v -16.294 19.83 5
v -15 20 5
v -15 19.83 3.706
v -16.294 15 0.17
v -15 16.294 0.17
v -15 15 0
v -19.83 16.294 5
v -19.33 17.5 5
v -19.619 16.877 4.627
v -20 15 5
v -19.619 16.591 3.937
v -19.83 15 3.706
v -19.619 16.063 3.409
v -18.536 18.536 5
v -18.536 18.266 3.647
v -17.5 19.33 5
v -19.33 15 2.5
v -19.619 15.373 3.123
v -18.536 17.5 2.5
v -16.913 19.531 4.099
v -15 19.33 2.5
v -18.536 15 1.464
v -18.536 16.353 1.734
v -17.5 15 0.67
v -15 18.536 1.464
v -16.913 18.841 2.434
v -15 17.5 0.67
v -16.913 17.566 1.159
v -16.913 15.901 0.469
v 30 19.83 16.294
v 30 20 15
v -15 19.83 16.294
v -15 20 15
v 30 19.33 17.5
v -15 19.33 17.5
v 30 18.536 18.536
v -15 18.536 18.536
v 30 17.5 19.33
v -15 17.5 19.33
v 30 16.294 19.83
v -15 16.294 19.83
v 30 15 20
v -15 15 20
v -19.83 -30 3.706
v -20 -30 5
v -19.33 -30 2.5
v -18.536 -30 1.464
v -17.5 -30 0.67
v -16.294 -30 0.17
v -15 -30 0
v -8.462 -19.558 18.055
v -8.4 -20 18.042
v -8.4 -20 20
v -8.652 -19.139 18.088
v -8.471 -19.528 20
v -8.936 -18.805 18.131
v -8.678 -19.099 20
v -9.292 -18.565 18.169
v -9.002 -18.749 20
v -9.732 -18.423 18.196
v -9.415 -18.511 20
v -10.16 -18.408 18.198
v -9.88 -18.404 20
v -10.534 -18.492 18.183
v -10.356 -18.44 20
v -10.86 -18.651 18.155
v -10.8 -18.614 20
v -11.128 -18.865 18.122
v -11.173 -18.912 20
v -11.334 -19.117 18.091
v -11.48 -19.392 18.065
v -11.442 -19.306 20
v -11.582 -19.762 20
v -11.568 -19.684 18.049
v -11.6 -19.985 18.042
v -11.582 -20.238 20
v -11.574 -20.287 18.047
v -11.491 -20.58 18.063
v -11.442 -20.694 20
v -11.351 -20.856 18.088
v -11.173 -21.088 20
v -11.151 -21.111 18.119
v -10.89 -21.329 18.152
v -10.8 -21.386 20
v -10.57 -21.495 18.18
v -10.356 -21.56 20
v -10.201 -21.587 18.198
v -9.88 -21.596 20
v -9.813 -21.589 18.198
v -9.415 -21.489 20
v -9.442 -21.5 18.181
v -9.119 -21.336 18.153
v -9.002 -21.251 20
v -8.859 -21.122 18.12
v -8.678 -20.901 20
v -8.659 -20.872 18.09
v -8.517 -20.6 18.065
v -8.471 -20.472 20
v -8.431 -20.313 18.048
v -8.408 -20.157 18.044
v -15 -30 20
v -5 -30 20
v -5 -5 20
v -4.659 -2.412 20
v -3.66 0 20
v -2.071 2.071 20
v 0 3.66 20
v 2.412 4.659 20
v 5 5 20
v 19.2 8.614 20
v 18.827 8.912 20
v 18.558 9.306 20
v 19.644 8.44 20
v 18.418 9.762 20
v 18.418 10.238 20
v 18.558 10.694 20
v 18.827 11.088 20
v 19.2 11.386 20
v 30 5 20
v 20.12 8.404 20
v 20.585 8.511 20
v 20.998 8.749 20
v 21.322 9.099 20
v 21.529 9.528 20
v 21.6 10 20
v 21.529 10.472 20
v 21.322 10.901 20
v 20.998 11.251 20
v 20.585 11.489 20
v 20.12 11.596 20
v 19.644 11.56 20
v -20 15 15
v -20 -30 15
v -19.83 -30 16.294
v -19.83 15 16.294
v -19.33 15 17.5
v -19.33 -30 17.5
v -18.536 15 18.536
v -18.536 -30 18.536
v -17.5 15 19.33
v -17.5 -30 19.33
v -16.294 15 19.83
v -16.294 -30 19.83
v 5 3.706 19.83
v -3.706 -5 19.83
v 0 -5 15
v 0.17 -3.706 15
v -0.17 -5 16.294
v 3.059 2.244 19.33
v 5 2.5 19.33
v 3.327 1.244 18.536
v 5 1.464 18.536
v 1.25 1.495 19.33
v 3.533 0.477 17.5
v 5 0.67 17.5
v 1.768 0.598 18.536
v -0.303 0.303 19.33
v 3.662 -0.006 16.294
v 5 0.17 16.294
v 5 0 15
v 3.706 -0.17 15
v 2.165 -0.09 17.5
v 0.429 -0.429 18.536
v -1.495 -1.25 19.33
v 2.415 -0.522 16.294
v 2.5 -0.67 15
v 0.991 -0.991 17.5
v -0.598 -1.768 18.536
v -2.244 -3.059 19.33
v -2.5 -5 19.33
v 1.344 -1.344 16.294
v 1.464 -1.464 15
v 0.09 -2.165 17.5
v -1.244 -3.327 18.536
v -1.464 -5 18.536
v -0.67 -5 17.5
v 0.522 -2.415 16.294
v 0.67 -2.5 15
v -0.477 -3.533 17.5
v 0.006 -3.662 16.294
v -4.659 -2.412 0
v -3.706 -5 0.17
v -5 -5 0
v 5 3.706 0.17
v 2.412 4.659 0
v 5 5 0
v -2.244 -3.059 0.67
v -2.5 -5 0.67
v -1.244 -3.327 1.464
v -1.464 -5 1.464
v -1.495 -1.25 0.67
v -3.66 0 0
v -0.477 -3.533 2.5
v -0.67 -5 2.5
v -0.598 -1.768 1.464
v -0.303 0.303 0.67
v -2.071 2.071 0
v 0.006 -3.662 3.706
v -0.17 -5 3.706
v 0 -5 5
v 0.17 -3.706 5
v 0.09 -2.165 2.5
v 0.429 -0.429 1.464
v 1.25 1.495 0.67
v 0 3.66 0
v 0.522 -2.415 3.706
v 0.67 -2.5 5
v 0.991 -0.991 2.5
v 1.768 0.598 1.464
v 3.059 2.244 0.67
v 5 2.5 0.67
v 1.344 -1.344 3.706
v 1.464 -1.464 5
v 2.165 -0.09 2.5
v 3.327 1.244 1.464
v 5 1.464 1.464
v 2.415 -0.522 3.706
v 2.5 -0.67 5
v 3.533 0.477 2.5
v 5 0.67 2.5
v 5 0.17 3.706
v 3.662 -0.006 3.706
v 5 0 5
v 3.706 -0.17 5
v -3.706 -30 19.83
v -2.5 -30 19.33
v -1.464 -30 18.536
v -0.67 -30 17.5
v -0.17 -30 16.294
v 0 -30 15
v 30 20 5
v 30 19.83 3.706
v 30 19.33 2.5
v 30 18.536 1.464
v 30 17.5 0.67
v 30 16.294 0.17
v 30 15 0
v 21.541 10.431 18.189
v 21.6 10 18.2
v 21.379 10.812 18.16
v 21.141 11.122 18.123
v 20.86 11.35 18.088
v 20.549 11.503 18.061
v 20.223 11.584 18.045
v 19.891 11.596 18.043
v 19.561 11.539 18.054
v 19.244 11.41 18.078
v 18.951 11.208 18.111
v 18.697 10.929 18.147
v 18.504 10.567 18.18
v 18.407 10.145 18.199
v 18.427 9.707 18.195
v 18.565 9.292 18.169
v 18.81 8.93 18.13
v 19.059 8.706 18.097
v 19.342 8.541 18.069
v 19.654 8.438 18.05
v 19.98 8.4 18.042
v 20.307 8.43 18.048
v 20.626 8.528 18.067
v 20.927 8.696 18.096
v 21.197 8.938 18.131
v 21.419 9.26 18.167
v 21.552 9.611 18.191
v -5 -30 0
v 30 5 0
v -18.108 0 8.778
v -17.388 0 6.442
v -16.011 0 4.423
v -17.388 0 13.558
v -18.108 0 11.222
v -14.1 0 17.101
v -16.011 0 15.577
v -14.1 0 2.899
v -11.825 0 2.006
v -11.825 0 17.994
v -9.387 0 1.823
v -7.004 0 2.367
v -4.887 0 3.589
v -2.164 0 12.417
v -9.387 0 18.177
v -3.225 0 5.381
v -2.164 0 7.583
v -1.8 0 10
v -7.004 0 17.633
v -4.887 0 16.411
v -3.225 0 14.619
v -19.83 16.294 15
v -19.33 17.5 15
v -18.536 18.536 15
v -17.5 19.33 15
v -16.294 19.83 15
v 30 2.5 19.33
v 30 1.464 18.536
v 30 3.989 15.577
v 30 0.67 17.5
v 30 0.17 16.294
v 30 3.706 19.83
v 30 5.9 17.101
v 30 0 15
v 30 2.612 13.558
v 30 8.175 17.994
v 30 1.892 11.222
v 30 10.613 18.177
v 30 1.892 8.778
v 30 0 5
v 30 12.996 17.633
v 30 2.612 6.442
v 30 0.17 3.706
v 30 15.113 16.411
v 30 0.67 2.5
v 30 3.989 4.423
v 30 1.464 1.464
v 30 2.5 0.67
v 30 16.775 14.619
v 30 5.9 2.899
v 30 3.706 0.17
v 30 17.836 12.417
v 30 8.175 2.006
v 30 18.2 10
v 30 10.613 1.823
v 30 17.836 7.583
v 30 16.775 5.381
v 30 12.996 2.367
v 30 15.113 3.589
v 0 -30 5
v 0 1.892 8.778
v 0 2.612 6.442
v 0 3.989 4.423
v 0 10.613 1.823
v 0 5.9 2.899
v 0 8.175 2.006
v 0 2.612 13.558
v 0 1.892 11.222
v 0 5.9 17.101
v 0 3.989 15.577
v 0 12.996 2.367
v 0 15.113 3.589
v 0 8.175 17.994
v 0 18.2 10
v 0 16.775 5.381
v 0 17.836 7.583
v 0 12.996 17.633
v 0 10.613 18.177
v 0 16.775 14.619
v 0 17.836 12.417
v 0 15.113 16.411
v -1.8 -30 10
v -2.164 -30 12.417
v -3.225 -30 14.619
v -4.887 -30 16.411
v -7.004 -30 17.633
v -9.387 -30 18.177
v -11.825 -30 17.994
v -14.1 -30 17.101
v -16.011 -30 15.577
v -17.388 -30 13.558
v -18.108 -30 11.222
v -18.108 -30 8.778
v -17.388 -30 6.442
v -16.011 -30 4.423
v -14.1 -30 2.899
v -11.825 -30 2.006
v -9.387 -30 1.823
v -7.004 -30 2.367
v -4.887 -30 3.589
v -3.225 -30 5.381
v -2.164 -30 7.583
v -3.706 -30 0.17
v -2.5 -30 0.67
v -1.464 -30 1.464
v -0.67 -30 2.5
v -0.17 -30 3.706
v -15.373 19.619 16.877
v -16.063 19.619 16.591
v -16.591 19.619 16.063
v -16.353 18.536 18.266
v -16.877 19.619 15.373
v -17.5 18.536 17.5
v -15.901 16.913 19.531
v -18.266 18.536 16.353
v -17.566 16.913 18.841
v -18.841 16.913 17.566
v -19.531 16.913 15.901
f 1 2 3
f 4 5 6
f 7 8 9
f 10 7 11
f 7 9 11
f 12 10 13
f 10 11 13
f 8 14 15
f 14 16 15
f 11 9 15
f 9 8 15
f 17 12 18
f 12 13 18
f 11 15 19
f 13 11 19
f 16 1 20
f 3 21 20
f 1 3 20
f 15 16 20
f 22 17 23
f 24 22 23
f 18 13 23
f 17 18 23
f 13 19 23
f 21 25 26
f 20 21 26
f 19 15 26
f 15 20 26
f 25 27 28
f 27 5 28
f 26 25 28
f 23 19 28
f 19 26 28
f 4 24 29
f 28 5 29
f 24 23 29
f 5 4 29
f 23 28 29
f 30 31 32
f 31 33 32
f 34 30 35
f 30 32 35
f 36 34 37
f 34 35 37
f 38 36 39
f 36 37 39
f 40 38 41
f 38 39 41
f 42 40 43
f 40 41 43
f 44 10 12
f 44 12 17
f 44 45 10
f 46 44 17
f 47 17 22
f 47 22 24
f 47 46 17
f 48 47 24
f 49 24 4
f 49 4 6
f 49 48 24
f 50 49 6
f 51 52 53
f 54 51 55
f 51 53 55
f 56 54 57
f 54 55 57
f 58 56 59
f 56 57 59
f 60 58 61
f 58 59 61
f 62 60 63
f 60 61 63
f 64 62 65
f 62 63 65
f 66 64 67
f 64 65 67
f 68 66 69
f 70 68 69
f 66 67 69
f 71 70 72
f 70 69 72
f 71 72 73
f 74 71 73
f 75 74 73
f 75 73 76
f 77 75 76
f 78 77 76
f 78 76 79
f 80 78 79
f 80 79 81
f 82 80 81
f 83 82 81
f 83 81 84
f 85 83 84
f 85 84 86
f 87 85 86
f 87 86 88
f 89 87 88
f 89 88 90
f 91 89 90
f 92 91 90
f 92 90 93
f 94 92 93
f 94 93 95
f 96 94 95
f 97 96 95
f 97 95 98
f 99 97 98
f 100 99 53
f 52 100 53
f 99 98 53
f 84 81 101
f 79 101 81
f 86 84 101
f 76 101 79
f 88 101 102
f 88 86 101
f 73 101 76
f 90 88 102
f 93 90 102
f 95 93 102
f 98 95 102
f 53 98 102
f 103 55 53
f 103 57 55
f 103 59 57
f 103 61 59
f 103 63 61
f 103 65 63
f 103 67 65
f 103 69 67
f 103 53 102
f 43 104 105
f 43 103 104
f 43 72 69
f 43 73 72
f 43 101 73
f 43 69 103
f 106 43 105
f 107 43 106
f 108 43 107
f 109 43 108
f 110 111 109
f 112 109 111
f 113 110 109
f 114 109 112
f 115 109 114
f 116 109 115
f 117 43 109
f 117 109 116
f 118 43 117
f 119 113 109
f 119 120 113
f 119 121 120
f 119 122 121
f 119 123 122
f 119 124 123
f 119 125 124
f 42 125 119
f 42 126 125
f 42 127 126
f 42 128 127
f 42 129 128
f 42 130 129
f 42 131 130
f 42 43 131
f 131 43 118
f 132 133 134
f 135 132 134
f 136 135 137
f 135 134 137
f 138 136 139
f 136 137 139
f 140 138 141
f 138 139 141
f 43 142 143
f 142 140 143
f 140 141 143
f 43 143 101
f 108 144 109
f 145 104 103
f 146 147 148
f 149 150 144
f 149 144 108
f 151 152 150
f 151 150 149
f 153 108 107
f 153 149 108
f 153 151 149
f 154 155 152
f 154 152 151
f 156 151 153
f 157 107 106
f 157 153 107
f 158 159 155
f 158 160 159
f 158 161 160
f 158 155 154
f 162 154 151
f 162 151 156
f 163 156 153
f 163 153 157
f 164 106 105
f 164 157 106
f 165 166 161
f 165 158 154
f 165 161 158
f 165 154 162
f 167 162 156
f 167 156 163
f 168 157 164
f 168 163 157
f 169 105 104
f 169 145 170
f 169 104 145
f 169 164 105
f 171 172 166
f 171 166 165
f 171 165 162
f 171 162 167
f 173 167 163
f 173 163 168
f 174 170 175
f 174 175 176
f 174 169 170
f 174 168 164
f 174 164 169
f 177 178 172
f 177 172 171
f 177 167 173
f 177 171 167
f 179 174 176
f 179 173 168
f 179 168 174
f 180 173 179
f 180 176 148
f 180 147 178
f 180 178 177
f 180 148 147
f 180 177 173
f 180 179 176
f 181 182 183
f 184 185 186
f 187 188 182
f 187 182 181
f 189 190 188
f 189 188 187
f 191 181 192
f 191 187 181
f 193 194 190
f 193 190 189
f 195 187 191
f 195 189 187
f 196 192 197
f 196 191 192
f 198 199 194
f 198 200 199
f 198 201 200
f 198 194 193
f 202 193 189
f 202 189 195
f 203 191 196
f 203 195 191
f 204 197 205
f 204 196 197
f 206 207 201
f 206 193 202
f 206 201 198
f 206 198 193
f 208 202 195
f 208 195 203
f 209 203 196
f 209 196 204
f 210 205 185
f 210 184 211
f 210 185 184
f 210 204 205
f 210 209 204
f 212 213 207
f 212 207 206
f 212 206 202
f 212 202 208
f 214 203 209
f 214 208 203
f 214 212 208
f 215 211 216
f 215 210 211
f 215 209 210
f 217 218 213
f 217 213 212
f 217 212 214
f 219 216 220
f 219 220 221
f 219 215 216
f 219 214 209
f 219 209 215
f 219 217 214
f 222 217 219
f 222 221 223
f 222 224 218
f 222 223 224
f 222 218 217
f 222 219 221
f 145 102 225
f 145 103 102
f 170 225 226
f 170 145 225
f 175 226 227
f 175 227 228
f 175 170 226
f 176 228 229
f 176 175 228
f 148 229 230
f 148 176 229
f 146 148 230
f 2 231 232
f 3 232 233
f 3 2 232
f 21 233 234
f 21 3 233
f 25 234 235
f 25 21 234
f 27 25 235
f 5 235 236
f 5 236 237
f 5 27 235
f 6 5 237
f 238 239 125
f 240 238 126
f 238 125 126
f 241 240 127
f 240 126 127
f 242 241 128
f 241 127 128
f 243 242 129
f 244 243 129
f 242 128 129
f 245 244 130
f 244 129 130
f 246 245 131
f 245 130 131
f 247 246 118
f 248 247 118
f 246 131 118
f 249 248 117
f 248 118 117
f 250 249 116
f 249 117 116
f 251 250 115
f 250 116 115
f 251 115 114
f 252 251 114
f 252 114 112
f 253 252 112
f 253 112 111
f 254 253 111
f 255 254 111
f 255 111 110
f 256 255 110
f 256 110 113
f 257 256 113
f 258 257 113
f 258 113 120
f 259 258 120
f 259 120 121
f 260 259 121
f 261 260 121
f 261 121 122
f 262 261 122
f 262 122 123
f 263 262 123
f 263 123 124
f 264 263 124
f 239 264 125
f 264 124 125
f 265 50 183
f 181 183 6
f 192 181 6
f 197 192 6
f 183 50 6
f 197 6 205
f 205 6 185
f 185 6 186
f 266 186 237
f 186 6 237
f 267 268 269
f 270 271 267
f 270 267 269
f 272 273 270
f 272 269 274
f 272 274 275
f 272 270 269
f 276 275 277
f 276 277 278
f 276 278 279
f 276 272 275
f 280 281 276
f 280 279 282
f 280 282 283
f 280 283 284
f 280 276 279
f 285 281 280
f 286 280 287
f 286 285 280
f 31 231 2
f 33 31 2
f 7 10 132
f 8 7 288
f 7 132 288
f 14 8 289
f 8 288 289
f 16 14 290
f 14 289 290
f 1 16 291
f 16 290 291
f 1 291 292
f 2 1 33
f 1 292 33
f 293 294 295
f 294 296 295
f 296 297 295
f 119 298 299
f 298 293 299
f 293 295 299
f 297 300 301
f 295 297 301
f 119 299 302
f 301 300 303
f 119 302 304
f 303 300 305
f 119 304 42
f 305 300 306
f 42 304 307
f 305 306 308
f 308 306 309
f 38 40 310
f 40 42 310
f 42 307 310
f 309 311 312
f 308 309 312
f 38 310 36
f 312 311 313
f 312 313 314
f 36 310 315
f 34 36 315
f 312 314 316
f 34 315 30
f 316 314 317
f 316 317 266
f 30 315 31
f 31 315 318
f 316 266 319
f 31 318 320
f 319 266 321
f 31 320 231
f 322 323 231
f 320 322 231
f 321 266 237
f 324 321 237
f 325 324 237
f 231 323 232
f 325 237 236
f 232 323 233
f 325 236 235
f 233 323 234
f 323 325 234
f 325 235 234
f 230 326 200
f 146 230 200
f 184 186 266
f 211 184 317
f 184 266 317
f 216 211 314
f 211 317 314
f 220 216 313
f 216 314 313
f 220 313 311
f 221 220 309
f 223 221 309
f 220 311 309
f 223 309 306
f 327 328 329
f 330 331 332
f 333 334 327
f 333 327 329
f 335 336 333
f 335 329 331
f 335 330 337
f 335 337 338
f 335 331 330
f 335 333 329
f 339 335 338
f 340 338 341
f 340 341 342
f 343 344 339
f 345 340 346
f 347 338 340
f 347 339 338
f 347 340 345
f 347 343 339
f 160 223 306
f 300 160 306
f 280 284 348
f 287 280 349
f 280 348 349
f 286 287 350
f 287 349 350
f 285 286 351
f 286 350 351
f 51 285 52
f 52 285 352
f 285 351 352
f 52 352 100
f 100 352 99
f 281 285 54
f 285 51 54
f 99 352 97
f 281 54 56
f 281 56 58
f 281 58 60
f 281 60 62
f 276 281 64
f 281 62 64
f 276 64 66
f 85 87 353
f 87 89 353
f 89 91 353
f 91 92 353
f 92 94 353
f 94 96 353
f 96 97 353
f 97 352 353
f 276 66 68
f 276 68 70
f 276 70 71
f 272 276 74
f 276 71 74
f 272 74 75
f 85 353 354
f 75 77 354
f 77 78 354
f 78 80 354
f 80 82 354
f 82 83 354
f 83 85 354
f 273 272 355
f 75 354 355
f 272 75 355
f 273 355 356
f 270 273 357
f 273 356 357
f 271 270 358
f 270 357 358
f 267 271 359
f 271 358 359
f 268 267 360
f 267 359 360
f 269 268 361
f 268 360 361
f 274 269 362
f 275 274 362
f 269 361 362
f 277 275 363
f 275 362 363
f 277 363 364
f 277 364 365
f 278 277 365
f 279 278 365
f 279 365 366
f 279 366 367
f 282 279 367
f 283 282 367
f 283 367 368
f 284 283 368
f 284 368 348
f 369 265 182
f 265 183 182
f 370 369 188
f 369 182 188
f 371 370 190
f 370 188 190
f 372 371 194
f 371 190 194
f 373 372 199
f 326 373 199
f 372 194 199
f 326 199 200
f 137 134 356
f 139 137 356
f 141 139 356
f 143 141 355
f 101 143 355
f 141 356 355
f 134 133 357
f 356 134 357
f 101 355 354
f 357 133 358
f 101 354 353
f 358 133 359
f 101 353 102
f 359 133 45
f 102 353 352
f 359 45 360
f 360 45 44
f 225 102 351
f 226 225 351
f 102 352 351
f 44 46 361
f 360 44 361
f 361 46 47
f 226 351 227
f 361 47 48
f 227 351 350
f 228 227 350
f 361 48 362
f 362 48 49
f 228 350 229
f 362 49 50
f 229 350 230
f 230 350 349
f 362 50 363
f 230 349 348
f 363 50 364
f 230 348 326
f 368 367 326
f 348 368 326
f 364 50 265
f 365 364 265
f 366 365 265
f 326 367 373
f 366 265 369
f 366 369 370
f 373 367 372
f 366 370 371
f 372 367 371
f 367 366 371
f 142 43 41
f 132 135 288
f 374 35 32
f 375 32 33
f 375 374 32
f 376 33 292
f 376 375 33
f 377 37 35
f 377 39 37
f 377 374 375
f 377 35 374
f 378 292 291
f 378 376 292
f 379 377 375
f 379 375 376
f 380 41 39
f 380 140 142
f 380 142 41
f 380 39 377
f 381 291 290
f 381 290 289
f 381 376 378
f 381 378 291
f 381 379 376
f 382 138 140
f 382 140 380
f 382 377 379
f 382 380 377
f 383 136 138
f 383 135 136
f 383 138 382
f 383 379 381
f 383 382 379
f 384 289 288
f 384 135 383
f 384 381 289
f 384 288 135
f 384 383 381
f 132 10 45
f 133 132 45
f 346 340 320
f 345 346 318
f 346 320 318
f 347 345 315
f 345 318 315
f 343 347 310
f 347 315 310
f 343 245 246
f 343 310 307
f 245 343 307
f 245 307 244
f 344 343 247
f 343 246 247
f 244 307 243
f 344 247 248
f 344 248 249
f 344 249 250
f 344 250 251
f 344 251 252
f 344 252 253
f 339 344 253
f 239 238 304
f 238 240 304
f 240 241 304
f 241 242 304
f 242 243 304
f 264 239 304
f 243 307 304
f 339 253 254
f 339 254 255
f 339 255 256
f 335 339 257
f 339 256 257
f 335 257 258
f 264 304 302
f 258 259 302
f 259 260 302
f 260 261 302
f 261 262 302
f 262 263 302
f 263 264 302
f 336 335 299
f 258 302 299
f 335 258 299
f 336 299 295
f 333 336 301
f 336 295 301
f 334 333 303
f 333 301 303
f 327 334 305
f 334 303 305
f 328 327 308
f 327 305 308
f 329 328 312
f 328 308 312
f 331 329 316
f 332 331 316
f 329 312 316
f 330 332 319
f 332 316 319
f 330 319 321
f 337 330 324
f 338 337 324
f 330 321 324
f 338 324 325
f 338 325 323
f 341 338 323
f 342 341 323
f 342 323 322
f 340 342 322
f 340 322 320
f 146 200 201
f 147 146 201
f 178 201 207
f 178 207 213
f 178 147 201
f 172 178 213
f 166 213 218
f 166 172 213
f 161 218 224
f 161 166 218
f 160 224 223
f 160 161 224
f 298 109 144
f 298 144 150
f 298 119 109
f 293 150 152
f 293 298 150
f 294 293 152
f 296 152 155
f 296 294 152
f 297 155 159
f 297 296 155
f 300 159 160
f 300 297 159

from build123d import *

# Parameters (mm, degrees)
PAD009_DEPTH    = 20
SKETCH027_R     = 8.2
POCKET015_DEPTH = 30
SKETCH028_R     = 8.2
POCKET016_DEPTH = 30
SKETCH031_R     = 1.6
POCKET018_DEPTH = 5
FILLET006_R     = 5


with BuildPart() as part:
    # Sketch026 → Pad009 (new body)
    with BuildSketch(Plane.XY):
        Polygon((-20, 20), (-20, -30), (0, -30), (0, 0), (30, 0), (30, 20), align=None)
    extrude(amount=PAD009_DEPTH)

    # Sketch027 → Pocket015 (cut)
    with BuildSketch(Plane.XZ.offset(30)):
        with Locations((-10, 10)):
            Circle(SKETCH027_R)
    extrude(amount=-POCKET015_DEPTH, mode=Mode.SUBTRACT)

    # Sketch028 → Pocket016 (cut)
    with BuildSketch(Plane.YZ.offset(30)):
        with Locations((10, 10)):
            Circle(SKETCH028_R)
    extrude(amount=-POCKET016_DEPTH, mode=Mode.SUBTRACT)

    # Sketch031 → Pocket018 (cut)
    with BuildSketch(Plane.XY.offset(20)):
        with Locations((20, 10)):
            Circle(SKETCH031_R)
        with Locations((-10, -20)):
            Circle(SKETCH031_R)
    extrude(amount=-POCKET018_DEPTH, mode=Mode.SUBTRACT)

    # Fillet006
    fillet006_edges = [part.edges().sort_by_distance(p)[0] for p in [
        (15, 0, 20),
        (0, -15, 20),
        (-20, -5, 20),
        (5, 20, 20),
        (5, 20, 0),
        (-20, 20, 10),
        (-20, -5, 0),
        (0, -15, 0),
        (15, 0, 0),
        (0, 0, 10),
    ]]
    fillet(fillet006_edges, radius=FILLET006_R)


solid = part.part
